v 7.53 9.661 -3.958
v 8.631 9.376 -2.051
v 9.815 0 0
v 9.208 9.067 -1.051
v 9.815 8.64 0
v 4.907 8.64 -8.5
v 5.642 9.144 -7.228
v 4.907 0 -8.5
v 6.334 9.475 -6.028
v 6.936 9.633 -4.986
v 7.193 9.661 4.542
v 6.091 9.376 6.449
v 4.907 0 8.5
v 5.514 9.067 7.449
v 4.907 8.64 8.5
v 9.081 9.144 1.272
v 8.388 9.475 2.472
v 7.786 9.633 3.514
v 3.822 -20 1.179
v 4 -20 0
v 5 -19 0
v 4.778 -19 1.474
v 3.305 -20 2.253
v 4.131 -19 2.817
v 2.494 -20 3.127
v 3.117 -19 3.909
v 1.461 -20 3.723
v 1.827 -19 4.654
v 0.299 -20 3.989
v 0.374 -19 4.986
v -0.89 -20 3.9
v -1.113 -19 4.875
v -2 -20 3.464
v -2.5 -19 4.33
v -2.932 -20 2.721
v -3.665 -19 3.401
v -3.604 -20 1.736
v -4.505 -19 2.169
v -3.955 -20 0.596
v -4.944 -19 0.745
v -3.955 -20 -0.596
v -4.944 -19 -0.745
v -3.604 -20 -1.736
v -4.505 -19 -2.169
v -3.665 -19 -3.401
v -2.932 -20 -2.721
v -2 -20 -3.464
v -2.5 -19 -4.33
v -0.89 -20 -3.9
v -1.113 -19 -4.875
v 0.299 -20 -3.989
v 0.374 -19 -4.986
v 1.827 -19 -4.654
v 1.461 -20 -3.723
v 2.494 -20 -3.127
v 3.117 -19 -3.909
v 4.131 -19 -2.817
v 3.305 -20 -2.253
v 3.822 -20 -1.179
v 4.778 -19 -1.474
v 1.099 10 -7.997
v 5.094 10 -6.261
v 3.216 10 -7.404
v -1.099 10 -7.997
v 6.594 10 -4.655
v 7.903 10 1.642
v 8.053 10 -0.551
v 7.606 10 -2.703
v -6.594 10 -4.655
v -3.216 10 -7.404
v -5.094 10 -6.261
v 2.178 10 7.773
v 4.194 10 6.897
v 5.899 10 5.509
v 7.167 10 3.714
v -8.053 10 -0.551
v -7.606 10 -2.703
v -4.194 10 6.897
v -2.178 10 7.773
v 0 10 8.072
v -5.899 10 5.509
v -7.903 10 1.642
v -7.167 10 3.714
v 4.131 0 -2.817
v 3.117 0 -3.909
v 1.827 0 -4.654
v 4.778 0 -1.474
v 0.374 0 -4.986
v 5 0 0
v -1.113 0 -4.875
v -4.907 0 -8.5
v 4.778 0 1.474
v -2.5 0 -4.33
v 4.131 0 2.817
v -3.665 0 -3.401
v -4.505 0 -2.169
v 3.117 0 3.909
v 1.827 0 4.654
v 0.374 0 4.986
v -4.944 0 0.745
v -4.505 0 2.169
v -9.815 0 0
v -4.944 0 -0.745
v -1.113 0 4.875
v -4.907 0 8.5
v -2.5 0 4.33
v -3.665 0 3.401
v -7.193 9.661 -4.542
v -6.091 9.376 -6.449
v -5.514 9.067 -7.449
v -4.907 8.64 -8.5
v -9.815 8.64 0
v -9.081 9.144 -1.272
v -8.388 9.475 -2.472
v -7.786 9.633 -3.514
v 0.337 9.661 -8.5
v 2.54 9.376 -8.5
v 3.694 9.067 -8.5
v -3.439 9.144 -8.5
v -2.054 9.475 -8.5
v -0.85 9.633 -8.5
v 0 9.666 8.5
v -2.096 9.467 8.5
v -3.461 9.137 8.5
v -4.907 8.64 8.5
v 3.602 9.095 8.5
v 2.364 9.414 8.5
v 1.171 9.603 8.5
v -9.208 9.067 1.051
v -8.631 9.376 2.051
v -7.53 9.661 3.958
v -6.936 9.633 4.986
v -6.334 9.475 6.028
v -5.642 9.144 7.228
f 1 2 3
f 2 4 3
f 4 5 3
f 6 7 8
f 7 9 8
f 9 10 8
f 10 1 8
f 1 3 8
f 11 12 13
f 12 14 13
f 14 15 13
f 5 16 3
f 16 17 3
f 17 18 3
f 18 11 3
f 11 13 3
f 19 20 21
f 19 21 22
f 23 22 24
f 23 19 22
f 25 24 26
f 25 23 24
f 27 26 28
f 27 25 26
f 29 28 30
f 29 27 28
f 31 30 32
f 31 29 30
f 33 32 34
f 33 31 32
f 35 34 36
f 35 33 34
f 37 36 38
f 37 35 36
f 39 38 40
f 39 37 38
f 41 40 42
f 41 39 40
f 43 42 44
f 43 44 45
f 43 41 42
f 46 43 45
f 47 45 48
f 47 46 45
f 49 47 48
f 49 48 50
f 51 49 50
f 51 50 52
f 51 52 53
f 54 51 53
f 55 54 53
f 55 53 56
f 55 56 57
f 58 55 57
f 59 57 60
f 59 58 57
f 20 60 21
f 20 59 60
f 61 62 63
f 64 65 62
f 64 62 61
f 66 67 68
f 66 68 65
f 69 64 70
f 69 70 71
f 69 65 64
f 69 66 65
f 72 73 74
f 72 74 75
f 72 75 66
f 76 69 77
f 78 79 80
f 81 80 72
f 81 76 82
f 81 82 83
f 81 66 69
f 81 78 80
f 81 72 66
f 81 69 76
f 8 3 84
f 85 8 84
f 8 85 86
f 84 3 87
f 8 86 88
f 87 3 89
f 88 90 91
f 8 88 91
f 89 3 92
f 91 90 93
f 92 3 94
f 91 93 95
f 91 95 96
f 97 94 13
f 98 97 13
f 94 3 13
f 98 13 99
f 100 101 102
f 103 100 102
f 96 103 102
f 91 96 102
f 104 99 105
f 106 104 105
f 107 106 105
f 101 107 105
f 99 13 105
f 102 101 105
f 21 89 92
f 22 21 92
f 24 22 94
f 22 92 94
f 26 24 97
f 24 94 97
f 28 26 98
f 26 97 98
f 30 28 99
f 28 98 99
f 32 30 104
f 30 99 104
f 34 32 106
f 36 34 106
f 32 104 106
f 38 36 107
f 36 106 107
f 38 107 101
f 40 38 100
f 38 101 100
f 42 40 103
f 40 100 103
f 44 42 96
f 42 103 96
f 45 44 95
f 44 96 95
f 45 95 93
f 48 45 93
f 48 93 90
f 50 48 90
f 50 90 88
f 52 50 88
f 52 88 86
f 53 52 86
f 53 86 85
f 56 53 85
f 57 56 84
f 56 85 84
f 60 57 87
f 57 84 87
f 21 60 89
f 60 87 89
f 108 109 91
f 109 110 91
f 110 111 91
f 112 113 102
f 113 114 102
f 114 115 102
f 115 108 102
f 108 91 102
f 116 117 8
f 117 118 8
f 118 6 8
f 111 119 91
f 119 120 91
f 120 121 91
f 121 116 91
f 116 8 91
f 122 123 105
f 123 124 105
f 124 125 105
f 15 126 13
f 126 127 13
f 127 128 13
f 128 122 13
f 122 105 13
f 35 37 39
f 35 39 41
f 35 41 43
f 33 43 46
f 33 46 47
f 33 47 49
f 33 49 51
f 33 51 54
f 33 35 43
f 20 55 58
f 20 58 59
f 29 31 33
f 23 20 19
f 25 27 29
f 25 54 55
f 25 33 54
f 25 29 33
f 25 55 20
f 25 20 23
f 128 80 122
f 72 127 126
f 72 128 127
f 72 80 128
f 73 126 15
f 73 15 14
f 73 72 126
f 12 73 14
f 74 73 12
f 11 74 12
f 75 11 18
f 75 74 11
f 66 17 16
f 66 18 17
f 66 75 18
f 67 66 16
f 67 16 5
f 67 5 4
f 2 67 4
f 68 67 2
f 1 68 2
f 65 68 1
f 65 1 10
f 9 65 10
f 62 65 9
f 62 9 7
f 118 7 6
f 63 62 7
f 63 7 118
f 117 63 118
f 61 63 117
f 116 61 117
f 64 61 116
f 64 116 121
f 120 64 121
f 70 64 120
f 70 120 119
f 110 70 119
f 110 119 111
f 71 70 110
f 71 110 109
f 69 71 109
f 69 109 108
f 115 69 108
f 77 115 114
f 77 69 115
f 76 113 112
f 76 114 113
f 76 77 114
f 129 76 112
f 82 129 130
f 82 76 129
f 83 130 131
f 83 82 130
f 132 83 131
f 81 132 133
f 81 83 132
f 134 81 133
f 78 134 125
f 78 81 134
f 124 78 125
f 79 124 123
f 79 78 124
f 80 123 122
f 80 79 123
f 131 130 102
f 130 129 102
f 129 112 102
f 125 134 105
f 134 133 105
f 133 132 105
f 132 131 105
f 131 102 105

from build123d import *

# Parameters (mm, degrees)
F1_R     = 5
F2_DEPTH = 20
F3_R     = 5
F4_DEPTH = 10
F7_SIZE  = 1


with BuildPart() as f2:
    # F1 (on Front) → F2 (new body)
    with BuildSketch(Plane.XZ):
        Circle(F1_R)
    extrude(amount=F2_DEPTH)

    # F3 (on face) → F4 (join)
    with BuildSketch(Plane(origin=(0, 0, 0), x_dir=(-1, 0, 0), z_dir=(0, 1, 0))):
        Polygon((4.9074772881, 8.5), (-4.9074772881, 8.5), (-9.8149545762, 0), (-4.9074772881, -8.5), (4.9074772881, -8.5), (9.8149545762, 0), align=None)
        Circle(F3_R, mode=Mode.SUBTRACT)
        Circle(F3_R)
    extrude(amount=F4_DEPTH)

    # F5 (on Right) → F6 (revolve, cut)
    with BuildSketch(Plane.YZ):
        Polygon((13.2906628903, 17.3963494964), (6.7229466513, 12.2716045007), (10, 8.0718332902), align=None)
    revolve(axis=Axis((0, 0, 0), (0, 1, 0)), mode=Mode.SUBTRACT)

    # F7
    f7_edges = [f2.edges().sort_by_distance(p)[0] for p in [
        (-5, -20, 0),
    ]]
    chamfer(f7_edges, length=F7_SIZE)


with BuildPart() as f8_1:
    # F8: copy of F2
    add(f2.part.moved(Location((25, 0, 0))))


with BuildPart() as f10_1:
    # F10: copy of F2
    add(f2.part)


with BuildPart() as f12_1:
    # F12: copy of F2
    add(f2.part.moved(Location((50, 0, 0))))


solid = f2.part
